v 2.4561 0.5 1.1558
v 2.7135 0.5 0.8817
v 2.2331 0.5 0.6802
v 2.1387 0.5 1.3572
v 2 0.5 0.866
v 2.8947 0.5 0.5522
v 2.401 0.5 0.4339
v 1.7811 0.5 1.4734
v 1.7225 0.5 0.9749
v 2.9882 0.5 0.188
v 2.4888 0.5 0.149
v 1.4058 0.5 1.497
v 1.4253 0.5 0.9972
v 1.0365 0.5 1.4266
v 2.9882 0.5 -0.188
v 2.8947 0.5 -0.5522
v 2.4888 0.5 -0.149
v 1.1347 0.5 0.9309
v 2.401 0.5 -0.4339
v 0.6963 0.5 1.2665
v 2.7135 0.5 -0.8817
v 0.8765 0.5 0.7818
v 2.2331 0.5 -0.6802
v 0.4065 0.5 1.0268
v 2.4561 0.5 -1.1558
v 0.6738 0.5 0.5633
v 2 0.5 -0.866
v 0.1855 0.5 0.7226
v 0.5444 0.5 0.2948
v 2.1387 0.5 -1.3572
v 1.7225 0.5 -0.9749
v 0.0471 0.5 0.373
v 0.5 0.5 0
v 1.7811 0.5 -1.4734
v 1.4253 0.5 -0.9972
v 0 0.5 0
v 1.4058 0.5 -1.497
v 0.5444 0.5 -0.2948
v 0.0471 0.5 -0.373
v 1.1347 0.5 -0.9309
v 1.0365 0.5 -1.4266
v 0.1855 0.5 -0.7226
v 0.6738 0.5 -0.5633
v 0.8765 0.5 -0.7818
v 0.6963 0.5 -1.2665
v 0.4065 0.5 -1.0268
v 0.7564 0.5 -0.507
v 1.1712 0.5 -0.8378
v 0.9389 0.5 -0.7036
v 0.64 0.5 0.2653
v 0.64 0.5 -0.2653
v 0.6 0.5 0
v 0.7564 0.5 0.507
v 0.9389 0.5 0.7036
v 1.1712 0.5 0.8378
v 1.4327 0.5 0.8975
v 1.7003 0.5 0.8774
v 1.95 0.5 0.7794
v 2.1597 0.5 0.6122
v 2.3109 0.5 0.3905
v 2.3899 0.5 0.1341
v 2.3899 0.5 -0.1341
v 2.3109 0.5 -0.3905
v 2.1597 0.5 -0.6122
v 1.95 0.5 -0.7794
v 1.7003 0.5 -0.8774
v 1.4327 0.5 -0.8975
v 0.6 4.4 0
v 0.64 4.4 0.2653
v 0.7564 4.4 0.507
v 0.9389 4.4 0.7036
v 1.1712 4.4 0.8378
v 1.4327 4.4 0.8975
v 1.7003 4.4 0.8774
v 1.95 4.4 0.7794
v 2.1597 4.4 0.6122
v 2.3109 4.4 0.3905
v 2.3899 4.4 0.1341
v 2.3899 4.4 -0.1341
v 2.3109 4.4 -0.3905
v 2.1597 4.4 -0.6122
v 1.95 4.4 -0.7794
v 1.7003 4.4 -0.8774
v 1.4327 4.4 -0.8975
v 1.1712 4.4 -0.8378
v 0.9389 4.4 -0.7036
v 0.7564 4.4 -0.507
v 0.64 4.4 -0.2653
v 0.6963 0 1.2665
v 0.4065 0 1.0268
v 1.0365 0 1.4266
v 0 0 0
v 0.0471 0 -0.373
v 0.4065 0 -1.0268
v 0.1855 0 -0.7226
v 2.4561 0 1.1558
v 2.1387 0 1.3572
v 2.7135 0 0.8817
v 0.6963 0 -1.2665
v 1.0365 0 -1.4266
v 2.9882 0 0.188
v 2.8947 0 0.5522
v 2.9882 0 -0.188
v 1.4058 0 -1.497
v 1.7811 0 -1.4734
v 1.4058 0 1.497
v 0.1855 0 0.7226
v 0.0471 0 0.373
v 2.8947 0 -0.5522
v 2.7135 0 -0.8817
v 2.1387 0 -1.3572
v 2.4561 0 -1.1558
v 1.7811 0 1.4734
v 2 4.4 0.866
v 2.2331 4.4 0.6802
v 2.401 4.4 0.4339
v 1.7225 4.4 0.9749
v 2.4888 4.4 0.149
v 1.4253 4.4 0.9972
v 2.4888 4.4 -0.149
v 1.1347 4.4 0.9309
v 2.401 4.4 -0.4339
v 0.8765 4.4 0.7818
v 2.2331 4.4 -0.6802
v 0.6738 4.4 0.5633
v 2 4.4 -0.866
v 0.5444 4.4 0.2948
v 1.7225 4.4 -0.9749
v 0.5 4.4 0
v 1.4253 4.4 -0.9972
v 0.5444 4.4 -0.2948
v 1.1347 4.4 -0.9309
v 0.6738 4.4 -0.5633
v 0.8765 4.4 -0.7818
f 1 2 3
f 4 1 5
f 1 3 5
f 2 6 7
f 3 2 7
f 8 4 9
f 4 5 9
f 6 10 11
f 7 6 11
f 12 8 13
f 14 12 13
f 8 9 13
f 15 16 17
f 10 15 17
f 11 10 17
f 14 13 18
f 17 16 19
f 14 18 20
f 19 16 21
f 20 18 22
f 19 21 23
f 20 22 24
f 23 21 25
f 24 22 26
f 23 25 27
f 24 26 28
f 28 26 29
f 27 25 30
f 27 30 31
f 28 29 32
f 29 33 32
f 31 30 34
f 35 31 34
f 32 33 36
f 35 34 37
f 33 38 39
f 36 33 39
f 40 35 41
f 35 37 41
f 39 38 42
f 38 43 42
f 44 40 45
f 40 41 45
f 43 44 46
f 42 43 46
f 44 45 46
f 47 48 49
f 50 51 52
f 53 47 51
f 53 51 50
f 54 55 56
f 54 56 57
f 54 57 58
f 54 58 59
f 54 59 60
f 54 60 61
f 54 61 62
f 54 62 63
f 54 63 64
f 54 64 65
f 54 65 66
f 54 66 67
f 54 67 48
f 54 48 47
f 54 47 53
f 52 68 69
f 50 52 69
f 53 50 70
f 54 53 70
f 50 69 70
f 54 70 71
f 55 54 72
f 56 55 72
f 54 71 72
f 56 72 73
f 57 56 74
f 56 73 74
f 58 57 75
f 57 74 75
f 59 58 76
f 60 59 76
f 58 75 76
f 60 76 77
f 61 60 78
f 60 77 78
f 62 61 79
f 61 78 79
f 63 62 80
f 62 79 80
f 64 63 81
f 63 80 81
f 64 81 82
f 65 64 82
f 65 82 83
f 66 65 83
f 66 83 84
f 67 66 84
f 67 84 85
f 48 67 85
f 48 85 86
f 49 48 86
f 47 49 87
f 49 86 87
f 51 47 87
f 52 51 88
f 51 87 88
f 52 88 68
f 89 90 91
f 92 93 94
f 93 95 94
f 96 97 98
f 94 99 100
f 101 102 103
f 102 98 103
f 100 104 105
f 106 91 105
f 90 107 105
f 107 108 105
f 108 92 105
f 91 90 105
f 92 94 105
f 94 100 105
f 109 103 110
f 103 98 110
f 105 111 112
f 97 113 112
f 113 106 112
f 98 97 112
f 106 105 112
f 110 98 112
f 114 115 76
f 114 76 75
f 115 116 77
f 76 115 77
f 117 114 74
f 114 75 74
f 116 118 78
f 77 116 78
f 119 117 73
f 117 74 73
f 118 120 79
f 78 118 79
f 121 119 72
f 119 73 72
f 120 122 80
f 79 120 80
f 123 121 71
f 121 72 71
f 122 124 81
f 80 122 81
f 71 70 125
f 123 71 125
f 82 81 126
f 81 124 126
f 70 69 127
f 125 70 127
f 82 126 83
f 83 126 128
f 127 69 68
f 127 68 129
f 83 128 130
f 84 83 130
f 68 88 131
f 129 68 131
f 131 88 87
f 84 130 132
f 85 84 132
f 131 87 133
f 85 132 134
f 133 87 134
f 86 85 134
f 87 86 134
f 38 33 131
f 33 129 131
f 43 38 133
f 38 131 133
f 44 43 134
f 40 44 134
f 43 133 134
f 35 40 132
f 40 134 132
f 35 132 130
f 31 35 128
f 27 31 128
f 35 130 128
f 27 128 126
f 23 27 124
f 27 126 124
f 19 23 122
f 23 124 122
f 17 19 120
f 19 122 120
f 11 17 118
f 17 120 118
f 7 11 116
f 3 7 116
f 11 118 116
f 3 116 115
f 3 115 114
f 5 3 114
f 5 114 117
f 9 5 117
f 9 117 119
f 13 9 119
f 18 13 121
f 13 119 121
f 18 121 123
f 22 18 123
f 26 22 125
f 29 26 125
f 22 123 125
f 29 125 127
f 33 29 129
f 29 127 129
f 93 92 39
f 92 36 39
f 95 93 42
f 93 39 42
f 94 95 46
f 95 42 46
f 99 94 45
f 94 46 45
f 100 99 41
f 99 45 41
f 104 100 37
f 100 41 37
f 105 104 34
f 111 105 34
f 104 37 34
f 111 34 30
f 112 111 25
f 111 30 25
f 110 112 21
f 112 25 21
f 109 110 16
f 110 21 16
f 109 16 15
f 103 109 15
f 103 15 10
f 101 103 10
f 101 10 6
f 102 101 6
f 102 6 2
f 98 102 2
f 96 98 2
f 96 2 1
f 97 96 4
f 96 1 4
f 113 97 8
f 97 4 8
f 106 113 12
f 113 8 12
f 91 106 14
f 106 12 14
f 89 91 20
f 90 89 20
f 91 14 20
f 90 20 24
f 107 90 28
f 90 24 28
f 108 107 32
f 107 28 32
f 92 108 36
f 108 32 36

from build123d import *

# Parameters (mm, degrees)
SKETCH_2_R          = 0.9
CUT_EXTRUDE_1_DEPTH = 3.9


with BuildPart() as part:
    # ｽｹｯﾁ1 → 回転1 (revolve)
    with BuildSketch(Plane.XY):
        Polygon((0, 0), (0, 0.5), (0.5, 0.5), (0.5, 4.4), (1.5, 4.4), (1.5, 0), align=None)
    revolve(axis=Axis((1.5, 4.4, 0), (0, -1, 0)))

    # ｽｹｯﾁ2 → ｶｯﾄ - 押し出し1 (cut)
    with BuildSketch(Plane(origin=(0, 4.4, 0), x_dir=(1, 0, 0), z_dir=(0, 1, 0))):
        with Locations(Location((1.5, 0, 0), (0, 0, 180))):
            Circle(SKETCH_2_R)
    extrude(amount=-CUT_EXTRUDE_1_DEPTH, mode=Mode.SUBTRACT)


solid = part.part
